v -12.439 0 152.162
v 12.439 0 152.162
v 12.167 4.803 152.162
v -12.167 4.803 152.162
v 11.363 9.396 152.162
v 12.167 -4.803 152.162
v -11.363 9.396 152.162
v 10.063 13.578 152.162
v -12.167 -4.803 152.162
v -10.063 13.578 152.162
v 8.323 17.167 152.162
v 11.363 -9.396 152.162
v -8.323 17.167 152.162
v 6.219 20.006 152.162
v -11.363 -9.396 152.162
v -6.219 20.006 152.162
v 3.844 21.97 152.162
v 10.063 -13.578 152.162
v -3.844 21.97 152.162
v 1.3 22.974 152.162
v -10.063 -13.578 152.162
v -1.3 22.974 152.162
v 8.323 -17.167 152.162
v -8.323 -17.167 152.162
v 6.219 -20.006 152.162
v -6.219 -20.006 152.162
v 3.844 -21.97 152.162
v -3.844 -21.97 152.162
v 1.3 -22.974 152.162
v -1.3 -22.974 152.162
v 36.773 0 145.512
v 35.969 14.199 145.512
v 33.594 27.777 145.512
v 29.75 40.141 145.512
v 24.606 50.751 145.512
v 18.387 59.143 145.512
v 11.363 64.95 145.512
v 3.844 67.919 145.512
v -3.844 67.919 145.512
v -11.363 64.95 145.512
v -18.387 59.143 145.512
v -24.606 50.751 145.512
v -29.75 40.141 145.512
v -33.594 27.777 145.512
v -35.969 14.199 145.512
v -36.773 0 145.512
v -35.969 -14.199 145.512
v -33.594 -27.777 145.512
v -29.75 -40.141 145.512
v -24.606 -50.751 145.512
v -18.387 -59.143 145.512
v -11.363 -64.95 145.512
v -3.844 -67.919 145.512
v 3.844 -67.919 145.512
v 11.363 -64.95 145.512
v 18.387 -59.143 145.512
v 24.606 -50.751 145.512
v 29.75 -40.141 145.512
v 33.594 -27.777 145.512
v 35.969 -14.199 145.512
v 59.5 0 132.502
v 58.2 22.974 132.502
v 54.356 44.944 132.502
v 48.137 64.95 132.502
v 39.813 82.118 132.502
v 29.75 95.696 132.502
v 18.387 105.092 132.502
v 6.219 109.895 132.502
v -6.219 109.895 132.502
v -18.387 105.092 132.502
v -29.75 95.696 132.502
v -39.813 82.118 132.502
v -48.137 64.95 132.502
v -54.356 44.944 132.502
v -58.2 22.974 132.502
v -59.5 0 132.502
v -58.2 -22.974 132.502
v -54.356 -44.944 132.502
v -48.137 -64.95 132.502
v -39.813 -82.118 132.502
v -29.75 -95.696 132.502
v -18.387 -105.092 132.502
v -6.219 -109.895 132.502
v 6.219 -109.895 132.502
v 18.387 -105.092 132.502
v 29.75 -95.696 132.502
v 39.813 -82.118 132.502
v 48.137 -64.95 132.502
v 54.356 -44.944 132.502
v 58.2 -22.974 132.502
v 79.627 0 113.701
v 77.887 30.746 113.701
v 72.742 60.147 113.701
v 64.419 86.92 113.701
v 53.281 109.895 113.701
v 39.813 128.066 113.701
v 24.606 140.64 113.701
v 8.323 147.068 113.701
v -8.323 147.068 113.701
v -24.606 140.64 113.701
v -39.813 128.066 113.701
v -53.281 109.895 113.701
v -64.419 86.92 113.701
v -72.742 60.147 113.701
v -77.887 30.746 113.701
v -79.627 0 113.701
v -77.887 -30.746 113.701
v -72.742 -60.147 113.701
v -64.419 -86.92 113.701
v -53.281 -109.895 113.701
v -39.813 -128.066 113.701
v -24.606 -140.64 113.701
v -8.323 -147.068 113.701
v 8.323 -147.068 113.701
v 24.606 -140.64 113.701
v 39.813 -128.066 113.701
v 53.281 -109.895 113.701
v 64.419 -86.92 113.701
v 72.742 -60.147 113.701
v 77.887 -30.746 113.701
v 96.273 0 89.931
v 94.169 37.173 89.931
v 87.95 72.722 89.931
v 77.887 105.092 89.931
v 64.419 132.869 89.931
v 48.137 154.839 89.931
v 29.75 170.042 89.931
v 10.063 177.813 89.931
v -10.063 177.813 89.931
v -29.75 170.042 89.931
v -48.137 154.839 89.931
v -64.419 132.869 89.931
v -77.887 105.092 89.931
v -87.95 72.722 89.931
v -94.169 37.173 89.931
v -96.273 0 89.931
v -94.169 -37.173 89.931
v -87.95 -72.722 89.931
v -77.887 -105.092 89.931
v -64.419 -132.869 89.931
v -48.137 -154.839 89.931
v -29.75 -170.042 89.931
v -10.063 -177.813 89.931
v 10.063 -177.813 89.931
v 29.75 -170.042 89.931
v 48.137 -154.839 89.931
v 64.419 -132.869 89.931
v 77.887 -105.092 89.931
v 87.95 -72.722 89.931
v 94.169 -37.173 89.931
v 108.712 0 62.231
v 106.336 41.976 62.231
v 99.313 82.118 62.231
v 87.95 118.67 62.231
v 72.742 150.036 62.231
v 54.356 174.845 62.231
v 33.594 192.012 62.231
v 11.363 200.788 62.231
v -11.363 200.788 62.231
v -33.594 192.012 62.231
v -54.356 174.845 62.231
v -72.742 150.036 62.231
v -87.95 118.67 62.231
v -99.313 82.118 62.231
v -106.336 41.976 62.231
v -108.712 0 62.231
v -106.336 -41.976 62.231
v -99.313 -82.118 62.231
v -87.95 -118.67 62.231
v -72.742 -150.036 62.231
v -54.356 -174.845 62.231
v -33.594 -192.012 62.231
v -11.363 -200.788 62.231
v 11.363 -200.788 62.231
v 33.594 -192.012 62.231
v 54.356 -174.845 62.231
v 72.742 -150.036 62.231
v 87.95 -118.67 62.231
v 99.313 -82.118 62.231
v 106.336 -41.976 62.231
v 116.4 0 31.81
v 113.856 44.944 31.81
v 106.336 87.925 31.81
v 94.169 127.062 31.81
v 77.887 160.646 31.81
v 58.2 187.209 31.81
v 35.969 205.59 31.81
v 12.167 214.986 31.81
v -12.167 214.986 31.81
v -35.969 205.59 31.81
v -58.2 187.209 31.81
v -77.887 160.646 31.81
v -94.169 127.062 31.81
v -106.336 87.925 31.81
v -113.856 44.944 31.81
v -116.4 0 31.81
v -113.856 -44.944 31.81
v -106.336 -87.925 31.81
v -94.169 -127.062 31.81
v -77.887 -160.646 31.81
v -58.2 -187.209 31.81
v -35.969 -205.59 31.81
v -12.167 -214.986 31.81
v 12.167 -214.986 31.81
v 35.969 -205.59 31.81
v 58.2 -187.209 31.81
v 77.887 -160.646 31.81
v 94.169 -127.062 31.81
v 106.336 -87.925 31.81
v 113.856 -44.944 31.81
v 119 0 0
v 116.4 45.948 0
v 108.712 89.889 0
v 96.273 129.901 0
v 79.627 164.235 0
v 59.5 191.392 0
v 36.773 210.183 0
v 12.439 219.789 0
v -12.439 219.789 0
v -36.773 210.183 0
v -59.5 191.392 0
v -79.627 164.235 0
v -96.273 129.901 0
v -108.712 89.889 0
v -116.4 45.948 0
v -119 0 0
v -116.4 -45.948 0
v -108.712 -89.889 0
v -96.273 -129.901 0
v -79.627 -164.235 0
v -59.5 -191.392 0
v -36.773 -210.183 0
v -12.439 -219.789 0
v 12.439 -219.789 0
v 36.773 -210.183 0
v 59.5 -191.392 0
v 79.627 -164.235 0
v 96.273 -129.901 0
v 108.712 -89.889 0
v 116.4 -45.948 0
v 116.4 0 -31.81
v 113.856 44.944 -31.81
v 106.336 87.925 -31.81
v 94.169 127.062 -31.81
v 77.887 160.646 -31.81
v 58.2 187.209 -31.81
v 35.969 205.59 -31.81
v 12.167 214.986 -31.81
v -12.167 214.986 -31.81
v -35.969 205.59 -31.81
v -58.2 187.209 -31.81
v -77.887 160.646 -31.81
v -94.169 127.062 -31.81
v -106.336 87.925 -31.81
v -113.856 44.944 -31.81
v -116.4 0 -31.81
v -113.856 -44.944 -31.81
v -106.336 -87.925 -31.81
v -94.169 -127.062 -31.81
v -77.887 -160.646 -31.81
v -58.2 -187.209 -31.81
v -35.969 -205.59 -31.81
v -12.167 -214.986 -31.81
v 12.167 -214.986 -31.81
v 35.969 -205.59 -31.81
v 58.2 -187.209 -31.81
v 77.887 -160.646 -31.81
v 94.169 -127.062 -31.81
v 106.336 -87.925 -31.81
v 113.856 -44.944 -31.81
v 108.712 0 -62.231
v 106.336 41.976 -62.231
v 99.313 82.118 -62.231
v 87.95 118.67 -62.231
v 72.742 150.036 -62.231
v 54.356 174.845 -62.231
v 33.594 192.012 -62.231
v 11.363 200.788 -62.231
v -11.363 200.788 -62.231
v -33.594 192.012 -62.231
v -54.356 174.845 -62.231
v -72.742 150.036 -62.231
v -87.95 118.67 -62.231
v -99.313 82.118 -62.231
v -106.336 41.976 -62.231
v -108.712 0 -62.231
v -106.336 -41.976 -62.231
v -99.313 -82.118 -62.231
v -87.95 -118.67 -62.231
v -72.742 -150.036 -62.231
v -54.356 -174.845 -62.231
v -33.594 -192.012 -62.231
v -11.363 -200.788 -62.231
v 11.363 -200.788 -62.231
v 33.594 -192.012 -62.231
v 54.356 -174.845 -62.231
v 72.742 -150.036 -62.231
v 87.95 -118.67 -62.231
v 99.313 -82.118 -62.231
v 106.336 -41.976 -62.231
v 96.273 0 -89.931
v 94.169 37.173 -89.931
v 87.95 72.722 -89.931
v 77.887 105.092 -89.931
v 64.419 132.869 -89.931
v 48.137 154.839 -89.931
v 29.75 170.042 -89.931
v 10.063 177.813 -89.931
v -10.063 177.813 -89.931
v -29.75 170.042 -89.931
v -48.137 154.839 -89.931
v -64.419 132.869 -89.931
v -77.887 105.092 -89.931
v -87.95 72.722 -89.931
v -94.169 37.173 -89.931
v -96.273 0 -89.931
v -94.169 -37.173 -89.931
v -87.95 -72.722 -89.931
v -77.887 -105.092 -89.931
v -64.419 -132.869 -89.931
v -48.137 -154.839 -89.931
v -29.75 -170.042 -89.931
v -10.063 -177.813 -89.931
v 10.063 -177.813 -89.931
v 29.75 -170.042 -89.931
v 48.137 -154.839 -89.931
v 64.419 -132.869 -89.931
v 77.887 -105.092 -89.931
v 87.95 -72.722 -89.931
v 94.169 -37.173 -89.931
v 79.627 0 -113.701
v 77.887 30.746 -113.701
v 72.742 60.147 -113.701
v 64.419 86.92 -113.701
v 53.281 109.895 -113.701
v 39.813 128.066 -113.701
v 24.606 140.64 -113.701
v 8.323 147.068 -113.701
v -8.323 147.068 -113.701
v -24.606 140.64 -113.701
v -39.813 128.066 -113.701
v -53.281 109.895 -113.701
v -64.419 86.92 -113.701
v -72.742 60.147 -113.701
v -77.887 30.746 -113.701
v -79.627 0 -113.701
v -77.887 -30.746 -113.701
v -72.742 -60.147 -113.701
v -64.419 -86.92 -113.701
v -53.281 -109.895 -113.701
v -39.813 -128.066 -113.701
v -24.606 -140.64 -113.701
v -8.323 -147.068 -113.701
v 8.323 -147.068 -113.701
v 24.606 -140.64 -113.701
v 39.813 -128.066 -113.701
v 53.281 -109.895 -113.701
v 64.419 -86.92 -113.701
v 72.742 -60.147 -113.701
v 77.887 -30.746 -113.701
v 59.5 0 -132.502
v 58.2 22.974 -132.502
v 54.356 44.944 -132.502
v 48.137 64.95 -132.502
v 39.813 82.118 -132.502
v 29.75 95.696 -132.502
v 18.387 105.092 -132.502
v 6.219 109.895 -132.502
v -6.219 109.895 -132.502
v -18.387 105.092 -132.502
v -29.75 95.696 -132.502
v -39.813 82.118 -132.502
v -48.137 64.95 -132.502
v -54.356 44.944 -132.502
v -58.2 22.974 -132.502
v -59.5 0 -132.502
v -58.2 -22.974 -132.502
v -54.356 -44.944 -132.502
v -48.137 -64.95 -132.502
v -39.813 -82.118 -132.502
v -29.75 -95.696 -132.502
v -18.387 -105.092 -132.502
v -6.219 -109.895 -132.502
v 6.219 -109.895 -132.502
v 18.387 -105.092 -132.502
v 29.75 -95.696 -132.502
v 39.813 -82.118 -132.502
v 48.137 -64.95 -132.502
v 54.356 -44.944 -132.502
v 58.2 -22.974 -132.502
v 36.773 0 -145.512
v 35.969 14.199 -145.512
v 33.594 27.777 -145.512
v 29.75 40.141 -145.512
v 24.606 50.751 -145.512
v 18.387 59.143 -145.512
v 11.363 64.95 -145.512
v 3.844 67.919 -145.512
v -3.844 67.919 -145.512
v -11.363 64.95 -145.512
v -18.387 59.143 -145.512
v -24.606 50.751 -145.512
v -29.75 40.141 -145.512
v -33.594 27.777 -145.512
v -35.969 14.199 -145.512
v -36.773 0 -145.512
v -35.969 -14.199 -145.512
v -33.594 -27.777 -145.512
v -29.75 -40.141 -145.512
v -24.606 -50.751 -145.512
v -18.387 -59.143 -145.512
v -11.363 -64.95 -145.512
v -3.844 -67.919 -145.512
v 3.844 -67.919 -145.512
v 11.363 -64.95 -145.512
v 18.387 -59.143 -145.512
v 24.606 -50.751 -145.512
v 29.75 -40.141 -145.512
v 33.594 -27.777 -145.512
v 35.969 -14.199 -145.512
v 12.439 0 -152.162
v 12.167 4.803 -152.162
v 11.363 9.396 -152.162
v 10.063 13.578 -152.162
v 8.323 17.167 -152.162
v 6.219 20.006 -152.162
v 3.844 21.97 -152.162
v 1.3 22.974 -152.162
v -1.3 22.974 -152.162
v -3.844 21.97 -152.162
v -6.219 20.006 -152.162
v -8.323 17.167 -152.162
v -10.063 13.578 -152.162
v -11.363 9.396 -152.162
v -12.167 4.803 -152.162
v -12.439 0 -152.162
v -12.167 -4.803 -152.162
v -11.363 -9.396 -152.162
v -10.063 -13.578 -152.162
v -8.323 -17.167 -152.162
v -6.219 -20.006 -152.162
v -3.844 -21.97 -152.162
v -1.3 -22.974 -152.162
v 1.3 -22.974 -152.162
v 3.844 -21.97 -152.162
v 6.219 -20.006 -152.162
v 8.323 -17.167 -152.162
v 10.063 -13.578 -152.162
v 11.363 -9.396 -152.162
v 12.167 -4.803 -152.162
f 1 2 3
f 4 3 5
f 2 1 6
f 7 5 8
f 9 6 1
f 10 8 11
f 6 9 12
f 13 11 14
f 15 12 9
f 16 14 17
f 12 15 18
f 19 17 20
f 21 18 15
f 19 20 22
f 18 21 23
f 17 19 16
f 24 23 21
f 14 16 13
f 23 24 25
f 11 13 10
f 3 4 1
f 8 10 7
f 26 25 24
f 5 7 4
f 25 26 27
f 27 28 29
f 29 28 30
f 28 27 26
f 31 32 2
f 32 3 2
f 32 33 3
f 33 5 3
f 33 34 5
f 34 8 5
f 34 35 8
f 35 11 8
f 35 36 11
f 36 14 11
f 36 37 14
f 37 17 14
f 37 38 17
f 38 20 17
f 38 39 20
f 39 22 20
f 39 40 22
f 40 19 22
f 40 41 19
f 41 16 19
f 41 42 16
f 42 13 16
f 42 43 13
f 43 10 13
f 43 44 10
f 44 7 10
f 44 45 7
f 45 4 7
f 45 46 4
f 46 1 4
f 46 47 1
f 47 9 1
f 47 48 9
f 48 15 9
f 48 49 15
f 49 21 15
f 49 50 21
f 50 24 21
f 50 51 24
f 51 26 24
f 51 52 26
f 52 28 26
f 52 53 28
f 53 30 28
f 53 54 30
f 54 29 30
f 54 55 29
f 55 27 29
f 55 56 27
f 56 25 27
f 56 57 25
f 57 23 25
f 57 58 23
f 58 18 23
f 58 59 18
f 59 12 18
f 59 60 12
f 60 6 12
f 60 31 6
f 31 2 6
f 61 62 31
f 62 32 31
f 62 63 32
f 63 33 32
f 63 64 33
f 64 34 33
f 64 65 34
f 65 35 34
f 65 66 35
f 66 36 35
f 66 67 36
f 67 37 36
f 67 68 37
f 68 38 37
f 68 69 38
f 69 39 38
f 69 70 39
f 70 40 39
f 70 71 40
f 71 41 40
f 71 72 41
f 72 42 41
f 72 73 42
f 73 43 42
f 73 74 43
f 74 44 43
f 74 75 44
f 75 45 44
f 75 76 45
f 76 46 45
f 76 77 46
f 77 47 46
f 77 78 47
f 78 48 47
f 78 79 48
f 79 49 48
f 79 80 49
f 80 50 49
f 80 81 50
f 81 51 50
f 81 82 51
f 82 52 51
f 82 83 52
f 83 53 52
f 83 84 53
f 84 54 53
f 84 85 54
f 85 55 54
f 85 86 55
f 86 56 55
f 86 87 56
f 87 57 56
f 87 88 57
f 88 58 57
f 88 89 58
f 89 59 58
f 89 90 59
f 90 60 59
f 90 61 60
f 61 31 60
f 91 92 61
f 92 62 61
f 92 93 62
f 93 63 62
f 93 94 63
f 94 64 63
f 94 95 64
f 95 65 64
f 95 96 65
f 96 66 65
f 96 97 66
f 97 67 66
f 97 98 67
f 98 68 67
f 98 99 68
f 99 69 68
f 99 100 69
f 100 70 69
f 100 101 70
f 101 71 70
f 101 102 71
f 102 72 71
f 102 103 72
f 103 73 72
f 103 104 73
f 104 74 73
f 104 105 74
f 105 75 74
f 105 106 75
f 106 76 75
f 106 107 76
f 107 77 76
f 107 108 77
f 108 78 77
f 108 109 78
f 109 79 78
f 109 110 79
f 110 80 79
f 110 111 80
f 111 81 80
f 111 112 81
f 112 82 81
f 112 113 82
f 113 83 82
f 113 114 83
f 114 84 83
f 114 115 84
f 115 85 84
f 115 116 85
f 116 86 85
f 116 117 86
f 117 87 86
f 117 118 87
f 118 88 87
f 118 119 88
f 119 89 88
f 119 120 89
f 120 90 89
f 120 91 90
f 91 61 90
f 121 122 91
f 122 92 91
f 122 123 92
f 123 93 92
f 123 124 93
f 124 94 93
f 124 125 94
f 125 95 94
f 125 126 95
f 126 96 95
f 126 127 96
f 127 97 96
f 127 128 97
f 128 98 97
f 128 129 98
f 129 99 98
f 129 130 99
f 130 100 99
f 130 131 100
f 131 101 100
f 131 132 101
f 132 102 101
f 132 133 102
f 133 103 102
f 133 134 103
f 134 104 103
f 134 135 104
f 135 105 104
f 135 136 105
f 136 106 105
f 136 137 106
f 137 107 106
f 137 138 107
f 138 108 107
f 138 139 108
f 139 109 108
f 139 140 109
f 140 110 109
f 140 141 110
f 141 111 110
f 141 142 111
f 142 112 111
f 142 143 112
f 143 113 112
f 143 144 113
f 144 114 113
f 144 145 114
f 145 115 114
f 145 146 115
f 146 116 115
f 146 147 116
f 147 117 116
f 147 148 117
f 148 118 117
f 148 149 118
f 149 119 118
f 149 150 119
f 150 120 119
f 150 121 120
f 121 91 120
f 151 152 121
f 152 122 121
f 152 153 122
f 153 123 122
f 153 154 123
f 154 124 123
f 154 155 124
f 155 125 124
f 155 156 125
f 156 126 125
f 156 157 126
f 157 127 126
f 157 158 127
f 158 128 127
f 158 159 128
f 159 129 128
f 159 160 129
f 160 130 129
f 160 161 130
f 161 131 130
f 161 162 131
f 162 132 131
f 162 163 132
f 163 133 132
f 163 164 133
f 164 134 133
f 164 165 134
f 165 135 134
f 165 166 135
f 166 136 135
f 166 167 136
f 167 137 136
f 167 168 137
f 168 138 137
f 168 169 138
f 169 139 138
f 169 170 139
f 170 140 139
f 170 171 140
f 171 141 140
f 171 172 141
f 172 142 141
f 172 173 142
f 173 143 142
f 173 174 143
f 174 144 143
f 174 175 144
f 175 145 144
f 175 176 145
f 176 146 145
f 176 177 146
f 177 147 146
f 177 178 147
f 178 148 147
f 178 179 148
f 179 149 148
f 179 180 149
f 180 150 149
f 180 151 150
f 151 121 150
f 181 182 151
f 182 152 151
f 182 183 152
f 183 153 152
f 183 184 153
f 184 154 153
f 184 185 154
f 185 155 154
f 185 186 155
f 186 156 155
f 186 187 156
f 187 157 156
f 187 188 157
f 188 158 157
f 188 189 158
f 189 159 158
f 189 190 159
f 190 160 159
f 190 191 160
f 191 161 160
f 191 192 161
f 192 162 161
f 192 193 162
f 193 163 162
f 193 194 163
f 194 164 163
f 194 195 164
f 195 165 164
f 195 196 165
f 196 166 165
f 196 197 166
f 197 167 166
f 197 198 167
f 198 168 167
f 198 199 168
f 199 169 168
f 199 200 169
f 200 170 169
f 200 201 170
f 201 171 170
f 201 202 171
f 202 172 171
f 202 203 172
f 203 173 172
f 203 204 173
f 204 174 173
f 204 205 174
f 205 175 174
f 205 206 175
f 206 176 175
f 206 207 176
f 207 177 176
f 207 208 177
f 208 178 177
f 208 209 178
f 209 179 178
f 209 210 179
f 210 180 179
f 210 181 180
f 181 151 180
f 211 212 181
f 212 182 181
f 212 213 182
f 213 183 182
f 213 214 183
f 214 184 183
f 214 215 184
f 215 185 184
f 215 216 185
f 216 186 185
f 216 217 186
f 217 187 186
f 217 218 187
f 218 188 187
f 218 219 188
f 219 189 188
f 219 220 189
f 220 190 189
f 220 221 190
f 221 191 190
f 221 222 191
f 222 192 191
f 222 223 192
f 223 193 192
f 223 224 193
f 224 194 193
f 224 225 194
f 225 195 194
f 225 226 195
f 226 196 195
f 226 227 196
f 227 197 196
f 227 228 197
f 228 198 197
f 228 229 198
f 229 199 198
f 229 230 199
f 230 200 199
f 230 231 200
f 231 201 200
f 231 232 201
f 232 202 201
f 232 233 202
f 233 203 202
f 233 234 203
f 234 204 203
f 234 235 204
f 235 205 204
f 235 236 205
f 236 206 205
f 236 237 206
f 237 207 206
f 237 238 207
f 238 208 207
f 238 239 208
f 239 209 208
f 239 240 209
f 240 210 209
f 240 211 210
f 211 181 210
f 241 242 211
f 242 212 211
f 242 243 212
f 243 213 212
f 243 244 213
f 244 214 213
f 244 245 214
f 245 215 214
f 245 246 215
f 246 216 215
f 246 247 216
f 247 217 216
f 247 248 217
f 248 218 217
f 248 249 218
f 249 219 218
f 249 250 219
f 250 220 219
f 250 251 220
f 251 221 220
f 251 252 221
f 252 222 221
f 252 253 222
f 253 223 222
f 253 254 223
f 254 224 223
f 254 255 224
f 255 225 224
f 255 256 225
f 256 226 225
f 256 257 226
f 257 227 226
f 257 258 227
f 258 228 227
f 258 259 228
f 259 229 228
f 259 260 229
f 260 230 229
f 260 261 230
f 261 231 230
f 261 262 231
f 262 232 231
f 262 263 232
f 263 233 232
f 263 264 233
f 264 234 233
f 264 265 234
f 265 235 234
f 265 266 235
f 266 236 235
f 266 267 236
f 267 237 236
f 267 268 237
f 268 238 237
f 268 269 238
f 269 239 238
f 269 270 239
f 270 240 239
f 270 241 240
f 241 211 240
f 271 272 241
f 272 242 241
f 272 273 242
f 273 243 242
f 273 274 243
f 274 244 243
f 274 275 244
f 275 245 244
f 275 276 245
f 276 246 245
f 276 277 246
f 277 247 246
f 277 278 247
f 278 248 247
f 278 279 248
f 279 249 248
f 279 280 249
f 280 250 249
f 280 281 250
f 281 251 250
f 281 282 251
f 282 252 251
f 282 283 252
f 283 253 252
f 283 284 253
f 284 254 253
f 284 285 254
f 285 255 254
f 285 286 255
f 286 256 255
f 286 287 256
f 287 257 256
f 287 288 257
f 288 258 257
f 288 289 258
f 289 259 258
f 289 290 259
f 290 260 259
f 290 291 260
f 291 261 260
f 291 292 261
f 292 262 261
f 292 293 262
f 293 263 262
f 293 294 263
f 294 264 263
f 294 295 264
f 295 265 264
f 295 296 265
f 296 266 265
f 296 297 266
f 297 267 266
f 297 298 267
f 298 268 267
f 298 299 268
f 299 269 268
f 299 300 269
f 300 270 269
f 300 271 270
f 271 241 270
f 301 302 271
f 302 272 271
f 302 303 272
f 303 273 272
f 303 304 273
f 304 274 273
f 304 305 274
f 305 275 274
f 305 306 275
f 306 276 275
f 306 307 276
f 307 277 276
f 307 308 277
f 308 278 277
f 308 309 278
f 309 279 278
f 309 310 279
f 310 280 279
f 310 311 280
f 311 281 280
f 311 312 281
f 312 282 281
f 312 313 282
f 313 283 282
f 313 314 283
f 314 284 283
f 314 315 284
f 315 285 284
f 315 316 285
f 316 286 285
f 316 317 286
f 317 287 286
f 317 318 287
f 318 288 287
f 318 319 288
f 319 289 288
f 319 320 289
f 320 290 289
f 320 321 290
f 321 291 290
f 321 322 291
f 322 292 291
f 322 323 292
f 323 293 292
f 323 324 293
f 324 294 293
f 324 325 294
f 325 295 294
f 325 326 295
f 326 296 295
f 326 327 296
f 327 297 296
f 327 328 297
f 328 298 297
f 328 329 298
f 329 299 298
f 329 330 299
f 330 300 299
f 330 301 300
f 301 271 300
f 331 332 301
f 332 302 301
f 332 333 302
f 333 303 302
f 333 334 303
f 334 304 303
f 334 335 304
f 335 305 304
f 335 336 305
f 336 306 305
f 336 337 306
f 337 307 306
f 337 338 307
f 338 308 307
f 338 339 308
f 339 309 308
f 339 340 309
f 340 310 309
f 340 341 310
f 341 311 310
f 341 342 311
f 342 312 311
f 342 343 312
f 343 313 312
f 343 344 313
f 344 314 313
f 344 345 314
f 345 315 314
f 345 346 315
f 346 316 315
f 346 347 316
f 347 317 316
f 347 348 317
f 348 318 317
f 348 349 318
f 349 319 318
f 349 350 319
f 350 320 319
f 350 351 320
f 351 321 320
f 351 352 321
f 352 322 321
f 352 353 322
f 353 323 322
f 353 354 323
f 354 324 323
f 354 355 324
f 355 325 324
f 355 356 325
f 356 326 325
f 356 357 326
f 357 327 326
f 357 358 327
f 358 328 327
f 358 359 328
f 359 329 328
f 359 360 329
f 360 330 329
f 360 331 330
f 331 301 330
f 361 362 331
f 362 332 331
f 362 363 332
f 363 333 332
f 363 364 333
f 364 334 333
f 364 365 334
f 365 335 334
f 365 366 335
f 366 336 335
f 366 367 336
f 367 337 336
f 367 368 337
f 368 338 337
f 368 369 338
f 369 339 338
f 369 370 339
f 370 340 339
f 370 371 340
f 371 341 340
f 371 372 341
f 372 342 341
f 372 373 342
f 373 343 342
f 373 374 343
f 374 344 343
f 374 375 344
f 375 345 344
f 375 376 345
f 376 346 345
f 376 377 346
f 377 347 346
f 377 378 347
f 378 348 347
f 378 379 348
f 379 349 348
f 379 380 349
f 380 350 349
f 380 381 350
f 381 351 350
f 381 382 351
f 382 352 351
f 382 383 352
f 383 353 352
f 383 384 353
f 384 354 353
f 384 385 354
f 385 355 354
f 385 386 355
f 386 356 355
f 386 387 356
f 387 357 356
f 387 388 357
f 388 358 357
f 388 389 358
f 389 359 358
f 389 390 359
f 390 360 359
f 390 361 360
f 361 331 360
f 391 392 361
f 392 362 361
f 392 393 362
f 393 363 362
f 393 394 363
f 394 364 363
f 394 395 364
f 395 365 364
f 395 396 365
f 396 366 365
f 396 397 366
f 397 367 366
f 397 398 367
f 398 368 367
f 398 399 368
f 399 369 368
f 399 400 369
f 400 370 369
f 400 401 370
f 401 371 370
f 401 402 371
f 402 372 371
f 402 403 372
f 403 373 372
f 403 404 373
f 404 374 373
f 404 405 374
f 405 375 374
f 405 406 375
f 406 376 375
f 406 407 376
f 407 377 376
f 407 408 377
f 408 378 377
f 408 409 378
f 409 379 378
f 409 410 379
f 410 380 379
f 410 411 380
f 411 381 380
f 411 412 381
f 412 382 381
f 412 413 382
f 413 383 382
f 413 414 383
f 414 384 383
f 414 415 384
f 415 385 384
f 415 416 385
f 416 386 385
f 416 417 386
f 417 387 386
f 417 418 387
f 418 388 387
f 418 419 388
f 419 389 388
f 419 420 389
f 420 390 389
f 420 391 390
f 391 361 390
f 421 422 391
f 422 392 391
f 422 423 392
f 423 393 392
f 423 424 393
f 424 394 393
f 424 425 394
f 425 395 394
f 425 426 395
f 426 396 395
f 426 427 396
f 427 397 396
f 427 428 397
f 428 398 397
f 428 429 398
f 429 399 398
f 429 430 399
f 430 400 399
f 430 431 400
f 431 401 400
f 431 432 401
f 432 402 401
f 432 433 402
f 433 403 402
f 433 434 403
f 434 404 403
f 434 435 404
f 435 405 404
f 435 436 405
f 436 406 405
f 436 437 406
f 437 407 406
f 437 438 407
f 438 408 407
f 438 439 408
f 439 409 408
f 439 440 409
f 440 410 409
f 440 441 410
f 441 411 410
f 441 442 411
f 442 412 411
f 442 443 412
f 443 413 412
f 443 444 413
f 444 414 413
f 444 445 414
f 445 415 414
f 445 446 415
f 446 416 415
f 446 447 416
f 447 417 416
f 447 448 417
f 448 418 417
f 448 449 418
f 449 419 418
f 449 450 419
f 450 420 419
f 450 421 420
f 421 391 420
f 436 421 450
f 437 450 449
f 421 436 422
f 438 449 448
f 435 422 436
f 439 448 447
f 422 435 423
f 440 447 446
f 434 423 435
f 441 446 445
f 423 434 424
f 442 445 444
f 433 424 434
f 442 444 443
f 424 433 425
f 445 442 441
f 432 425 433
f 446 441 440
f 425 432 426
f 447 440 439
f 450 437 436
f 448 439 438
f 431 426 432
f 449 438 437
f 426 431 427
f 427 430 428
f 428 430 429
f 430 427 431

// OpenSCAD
// Generated by SolidPython 1.0.1 on 2020-07-29 00:46:47


scale(v = [7, 13, 9]) {
	sphere(r = 17);
}
/***********************************************
*********      SolidPython code:      **********
************************************************
 
# import packages: SolidPython
from solid import *
from solid.utils import *
from itertools import chain, combinations, permutations


class Resize:

    def __init__(self, scad_file):
        self.scad_file = scad_file
        #self.scad_file = import_scad(scad_file)
        # cone/cylinder param:
        self.r1 = 0
        self.r2 = 0
        self.h = 0
        # rectangular prism param:
        self.w = 0
        self.l = 0
        # ellipse param:
        self.r = 0

    # import OpenScad code (file name corresponds to shape)


    # classify shape + parameters
    def assign(self, param1, param2, param3):
        if self.scad_file == 'cone.scad':
            self.r1 = param1
            self.r2 = param2
            self.h = param3
        elif self.scad_file == 'cylinder.scad':
            self.r1 = param1
            self.r2 = param2
            self.h = param3
        elif self.scad_file == 'rectangularPrism.scad':
            self.h = param1
            self.l = param2
            self.w = param3
        else:
            self.r = param1
            self.h = param2

    # resize parameters
    def iterate(self):
        x = range(3, 20, 2)
        i = 1
        if self.scad_file == 'cone.scad':
            tempList = list(permutations(x, 2))
            for temp in tempList:
                param1 = temp[0]
                param2 = temp[1]
                filepath = 'produced_scad_files/' + 'cone' + str(param1) + '_' + str(param2) + '_' + '.scad'
                scad_render_to_file(cylinder(h=param1, r1=param2, r2=0), filepath)

        elif self.scad_file == 'cylinder.scad':
            tempList = list(permutations(x, 3))
            for temp in tempList:
                param1 = temp[0]
                param2 = temp[1]
                filepath = 'produced_scad_files/' + 'cylinder' + str(param1) + '_' + str(param2) + '_' + '.scad'
                scad_render_to_file(cylinder(h=param1, r1=param2, r2=param2), filepath)

        elif self.scad_file == 'rectangularPrism.scad':
            tempList = list(permutations(x, 3))
            for temp in tempList:
                param1 = temp[0]
                param2 = temp[1]
                param3 = temp[2]
                filepath = 'produced_scad_files/' + 'rectangularPrism' + str(param1) + '_' + str(param2) + '_' + str(
                    param3) + '.scad'
                scad_render_to_file(cube(size=(param1, param2, param3)), filepath)

        elif self.scad_file == 'ellipse.scad':
            tempList = list(permutations(x, 4))
            for temp in tempList:
                param1 = temp[0]
                param2 = temp[1]
                param3 = temp[2]
                param4 = temp[3]
                filepath = 'produced_scad_files/' + 'ellipse' + str(param1) + '_' + str(param2) + '_' + str(param3) + '_' + str(param4) + '.scad'
                scad_render_to_file(scale([param1, param2, param3])(sphere(r=param4)), filepath)

    def render_to_scadfile(self):
        scad_render_to_file(scad, 'example.scad') 
 
************************************************/
